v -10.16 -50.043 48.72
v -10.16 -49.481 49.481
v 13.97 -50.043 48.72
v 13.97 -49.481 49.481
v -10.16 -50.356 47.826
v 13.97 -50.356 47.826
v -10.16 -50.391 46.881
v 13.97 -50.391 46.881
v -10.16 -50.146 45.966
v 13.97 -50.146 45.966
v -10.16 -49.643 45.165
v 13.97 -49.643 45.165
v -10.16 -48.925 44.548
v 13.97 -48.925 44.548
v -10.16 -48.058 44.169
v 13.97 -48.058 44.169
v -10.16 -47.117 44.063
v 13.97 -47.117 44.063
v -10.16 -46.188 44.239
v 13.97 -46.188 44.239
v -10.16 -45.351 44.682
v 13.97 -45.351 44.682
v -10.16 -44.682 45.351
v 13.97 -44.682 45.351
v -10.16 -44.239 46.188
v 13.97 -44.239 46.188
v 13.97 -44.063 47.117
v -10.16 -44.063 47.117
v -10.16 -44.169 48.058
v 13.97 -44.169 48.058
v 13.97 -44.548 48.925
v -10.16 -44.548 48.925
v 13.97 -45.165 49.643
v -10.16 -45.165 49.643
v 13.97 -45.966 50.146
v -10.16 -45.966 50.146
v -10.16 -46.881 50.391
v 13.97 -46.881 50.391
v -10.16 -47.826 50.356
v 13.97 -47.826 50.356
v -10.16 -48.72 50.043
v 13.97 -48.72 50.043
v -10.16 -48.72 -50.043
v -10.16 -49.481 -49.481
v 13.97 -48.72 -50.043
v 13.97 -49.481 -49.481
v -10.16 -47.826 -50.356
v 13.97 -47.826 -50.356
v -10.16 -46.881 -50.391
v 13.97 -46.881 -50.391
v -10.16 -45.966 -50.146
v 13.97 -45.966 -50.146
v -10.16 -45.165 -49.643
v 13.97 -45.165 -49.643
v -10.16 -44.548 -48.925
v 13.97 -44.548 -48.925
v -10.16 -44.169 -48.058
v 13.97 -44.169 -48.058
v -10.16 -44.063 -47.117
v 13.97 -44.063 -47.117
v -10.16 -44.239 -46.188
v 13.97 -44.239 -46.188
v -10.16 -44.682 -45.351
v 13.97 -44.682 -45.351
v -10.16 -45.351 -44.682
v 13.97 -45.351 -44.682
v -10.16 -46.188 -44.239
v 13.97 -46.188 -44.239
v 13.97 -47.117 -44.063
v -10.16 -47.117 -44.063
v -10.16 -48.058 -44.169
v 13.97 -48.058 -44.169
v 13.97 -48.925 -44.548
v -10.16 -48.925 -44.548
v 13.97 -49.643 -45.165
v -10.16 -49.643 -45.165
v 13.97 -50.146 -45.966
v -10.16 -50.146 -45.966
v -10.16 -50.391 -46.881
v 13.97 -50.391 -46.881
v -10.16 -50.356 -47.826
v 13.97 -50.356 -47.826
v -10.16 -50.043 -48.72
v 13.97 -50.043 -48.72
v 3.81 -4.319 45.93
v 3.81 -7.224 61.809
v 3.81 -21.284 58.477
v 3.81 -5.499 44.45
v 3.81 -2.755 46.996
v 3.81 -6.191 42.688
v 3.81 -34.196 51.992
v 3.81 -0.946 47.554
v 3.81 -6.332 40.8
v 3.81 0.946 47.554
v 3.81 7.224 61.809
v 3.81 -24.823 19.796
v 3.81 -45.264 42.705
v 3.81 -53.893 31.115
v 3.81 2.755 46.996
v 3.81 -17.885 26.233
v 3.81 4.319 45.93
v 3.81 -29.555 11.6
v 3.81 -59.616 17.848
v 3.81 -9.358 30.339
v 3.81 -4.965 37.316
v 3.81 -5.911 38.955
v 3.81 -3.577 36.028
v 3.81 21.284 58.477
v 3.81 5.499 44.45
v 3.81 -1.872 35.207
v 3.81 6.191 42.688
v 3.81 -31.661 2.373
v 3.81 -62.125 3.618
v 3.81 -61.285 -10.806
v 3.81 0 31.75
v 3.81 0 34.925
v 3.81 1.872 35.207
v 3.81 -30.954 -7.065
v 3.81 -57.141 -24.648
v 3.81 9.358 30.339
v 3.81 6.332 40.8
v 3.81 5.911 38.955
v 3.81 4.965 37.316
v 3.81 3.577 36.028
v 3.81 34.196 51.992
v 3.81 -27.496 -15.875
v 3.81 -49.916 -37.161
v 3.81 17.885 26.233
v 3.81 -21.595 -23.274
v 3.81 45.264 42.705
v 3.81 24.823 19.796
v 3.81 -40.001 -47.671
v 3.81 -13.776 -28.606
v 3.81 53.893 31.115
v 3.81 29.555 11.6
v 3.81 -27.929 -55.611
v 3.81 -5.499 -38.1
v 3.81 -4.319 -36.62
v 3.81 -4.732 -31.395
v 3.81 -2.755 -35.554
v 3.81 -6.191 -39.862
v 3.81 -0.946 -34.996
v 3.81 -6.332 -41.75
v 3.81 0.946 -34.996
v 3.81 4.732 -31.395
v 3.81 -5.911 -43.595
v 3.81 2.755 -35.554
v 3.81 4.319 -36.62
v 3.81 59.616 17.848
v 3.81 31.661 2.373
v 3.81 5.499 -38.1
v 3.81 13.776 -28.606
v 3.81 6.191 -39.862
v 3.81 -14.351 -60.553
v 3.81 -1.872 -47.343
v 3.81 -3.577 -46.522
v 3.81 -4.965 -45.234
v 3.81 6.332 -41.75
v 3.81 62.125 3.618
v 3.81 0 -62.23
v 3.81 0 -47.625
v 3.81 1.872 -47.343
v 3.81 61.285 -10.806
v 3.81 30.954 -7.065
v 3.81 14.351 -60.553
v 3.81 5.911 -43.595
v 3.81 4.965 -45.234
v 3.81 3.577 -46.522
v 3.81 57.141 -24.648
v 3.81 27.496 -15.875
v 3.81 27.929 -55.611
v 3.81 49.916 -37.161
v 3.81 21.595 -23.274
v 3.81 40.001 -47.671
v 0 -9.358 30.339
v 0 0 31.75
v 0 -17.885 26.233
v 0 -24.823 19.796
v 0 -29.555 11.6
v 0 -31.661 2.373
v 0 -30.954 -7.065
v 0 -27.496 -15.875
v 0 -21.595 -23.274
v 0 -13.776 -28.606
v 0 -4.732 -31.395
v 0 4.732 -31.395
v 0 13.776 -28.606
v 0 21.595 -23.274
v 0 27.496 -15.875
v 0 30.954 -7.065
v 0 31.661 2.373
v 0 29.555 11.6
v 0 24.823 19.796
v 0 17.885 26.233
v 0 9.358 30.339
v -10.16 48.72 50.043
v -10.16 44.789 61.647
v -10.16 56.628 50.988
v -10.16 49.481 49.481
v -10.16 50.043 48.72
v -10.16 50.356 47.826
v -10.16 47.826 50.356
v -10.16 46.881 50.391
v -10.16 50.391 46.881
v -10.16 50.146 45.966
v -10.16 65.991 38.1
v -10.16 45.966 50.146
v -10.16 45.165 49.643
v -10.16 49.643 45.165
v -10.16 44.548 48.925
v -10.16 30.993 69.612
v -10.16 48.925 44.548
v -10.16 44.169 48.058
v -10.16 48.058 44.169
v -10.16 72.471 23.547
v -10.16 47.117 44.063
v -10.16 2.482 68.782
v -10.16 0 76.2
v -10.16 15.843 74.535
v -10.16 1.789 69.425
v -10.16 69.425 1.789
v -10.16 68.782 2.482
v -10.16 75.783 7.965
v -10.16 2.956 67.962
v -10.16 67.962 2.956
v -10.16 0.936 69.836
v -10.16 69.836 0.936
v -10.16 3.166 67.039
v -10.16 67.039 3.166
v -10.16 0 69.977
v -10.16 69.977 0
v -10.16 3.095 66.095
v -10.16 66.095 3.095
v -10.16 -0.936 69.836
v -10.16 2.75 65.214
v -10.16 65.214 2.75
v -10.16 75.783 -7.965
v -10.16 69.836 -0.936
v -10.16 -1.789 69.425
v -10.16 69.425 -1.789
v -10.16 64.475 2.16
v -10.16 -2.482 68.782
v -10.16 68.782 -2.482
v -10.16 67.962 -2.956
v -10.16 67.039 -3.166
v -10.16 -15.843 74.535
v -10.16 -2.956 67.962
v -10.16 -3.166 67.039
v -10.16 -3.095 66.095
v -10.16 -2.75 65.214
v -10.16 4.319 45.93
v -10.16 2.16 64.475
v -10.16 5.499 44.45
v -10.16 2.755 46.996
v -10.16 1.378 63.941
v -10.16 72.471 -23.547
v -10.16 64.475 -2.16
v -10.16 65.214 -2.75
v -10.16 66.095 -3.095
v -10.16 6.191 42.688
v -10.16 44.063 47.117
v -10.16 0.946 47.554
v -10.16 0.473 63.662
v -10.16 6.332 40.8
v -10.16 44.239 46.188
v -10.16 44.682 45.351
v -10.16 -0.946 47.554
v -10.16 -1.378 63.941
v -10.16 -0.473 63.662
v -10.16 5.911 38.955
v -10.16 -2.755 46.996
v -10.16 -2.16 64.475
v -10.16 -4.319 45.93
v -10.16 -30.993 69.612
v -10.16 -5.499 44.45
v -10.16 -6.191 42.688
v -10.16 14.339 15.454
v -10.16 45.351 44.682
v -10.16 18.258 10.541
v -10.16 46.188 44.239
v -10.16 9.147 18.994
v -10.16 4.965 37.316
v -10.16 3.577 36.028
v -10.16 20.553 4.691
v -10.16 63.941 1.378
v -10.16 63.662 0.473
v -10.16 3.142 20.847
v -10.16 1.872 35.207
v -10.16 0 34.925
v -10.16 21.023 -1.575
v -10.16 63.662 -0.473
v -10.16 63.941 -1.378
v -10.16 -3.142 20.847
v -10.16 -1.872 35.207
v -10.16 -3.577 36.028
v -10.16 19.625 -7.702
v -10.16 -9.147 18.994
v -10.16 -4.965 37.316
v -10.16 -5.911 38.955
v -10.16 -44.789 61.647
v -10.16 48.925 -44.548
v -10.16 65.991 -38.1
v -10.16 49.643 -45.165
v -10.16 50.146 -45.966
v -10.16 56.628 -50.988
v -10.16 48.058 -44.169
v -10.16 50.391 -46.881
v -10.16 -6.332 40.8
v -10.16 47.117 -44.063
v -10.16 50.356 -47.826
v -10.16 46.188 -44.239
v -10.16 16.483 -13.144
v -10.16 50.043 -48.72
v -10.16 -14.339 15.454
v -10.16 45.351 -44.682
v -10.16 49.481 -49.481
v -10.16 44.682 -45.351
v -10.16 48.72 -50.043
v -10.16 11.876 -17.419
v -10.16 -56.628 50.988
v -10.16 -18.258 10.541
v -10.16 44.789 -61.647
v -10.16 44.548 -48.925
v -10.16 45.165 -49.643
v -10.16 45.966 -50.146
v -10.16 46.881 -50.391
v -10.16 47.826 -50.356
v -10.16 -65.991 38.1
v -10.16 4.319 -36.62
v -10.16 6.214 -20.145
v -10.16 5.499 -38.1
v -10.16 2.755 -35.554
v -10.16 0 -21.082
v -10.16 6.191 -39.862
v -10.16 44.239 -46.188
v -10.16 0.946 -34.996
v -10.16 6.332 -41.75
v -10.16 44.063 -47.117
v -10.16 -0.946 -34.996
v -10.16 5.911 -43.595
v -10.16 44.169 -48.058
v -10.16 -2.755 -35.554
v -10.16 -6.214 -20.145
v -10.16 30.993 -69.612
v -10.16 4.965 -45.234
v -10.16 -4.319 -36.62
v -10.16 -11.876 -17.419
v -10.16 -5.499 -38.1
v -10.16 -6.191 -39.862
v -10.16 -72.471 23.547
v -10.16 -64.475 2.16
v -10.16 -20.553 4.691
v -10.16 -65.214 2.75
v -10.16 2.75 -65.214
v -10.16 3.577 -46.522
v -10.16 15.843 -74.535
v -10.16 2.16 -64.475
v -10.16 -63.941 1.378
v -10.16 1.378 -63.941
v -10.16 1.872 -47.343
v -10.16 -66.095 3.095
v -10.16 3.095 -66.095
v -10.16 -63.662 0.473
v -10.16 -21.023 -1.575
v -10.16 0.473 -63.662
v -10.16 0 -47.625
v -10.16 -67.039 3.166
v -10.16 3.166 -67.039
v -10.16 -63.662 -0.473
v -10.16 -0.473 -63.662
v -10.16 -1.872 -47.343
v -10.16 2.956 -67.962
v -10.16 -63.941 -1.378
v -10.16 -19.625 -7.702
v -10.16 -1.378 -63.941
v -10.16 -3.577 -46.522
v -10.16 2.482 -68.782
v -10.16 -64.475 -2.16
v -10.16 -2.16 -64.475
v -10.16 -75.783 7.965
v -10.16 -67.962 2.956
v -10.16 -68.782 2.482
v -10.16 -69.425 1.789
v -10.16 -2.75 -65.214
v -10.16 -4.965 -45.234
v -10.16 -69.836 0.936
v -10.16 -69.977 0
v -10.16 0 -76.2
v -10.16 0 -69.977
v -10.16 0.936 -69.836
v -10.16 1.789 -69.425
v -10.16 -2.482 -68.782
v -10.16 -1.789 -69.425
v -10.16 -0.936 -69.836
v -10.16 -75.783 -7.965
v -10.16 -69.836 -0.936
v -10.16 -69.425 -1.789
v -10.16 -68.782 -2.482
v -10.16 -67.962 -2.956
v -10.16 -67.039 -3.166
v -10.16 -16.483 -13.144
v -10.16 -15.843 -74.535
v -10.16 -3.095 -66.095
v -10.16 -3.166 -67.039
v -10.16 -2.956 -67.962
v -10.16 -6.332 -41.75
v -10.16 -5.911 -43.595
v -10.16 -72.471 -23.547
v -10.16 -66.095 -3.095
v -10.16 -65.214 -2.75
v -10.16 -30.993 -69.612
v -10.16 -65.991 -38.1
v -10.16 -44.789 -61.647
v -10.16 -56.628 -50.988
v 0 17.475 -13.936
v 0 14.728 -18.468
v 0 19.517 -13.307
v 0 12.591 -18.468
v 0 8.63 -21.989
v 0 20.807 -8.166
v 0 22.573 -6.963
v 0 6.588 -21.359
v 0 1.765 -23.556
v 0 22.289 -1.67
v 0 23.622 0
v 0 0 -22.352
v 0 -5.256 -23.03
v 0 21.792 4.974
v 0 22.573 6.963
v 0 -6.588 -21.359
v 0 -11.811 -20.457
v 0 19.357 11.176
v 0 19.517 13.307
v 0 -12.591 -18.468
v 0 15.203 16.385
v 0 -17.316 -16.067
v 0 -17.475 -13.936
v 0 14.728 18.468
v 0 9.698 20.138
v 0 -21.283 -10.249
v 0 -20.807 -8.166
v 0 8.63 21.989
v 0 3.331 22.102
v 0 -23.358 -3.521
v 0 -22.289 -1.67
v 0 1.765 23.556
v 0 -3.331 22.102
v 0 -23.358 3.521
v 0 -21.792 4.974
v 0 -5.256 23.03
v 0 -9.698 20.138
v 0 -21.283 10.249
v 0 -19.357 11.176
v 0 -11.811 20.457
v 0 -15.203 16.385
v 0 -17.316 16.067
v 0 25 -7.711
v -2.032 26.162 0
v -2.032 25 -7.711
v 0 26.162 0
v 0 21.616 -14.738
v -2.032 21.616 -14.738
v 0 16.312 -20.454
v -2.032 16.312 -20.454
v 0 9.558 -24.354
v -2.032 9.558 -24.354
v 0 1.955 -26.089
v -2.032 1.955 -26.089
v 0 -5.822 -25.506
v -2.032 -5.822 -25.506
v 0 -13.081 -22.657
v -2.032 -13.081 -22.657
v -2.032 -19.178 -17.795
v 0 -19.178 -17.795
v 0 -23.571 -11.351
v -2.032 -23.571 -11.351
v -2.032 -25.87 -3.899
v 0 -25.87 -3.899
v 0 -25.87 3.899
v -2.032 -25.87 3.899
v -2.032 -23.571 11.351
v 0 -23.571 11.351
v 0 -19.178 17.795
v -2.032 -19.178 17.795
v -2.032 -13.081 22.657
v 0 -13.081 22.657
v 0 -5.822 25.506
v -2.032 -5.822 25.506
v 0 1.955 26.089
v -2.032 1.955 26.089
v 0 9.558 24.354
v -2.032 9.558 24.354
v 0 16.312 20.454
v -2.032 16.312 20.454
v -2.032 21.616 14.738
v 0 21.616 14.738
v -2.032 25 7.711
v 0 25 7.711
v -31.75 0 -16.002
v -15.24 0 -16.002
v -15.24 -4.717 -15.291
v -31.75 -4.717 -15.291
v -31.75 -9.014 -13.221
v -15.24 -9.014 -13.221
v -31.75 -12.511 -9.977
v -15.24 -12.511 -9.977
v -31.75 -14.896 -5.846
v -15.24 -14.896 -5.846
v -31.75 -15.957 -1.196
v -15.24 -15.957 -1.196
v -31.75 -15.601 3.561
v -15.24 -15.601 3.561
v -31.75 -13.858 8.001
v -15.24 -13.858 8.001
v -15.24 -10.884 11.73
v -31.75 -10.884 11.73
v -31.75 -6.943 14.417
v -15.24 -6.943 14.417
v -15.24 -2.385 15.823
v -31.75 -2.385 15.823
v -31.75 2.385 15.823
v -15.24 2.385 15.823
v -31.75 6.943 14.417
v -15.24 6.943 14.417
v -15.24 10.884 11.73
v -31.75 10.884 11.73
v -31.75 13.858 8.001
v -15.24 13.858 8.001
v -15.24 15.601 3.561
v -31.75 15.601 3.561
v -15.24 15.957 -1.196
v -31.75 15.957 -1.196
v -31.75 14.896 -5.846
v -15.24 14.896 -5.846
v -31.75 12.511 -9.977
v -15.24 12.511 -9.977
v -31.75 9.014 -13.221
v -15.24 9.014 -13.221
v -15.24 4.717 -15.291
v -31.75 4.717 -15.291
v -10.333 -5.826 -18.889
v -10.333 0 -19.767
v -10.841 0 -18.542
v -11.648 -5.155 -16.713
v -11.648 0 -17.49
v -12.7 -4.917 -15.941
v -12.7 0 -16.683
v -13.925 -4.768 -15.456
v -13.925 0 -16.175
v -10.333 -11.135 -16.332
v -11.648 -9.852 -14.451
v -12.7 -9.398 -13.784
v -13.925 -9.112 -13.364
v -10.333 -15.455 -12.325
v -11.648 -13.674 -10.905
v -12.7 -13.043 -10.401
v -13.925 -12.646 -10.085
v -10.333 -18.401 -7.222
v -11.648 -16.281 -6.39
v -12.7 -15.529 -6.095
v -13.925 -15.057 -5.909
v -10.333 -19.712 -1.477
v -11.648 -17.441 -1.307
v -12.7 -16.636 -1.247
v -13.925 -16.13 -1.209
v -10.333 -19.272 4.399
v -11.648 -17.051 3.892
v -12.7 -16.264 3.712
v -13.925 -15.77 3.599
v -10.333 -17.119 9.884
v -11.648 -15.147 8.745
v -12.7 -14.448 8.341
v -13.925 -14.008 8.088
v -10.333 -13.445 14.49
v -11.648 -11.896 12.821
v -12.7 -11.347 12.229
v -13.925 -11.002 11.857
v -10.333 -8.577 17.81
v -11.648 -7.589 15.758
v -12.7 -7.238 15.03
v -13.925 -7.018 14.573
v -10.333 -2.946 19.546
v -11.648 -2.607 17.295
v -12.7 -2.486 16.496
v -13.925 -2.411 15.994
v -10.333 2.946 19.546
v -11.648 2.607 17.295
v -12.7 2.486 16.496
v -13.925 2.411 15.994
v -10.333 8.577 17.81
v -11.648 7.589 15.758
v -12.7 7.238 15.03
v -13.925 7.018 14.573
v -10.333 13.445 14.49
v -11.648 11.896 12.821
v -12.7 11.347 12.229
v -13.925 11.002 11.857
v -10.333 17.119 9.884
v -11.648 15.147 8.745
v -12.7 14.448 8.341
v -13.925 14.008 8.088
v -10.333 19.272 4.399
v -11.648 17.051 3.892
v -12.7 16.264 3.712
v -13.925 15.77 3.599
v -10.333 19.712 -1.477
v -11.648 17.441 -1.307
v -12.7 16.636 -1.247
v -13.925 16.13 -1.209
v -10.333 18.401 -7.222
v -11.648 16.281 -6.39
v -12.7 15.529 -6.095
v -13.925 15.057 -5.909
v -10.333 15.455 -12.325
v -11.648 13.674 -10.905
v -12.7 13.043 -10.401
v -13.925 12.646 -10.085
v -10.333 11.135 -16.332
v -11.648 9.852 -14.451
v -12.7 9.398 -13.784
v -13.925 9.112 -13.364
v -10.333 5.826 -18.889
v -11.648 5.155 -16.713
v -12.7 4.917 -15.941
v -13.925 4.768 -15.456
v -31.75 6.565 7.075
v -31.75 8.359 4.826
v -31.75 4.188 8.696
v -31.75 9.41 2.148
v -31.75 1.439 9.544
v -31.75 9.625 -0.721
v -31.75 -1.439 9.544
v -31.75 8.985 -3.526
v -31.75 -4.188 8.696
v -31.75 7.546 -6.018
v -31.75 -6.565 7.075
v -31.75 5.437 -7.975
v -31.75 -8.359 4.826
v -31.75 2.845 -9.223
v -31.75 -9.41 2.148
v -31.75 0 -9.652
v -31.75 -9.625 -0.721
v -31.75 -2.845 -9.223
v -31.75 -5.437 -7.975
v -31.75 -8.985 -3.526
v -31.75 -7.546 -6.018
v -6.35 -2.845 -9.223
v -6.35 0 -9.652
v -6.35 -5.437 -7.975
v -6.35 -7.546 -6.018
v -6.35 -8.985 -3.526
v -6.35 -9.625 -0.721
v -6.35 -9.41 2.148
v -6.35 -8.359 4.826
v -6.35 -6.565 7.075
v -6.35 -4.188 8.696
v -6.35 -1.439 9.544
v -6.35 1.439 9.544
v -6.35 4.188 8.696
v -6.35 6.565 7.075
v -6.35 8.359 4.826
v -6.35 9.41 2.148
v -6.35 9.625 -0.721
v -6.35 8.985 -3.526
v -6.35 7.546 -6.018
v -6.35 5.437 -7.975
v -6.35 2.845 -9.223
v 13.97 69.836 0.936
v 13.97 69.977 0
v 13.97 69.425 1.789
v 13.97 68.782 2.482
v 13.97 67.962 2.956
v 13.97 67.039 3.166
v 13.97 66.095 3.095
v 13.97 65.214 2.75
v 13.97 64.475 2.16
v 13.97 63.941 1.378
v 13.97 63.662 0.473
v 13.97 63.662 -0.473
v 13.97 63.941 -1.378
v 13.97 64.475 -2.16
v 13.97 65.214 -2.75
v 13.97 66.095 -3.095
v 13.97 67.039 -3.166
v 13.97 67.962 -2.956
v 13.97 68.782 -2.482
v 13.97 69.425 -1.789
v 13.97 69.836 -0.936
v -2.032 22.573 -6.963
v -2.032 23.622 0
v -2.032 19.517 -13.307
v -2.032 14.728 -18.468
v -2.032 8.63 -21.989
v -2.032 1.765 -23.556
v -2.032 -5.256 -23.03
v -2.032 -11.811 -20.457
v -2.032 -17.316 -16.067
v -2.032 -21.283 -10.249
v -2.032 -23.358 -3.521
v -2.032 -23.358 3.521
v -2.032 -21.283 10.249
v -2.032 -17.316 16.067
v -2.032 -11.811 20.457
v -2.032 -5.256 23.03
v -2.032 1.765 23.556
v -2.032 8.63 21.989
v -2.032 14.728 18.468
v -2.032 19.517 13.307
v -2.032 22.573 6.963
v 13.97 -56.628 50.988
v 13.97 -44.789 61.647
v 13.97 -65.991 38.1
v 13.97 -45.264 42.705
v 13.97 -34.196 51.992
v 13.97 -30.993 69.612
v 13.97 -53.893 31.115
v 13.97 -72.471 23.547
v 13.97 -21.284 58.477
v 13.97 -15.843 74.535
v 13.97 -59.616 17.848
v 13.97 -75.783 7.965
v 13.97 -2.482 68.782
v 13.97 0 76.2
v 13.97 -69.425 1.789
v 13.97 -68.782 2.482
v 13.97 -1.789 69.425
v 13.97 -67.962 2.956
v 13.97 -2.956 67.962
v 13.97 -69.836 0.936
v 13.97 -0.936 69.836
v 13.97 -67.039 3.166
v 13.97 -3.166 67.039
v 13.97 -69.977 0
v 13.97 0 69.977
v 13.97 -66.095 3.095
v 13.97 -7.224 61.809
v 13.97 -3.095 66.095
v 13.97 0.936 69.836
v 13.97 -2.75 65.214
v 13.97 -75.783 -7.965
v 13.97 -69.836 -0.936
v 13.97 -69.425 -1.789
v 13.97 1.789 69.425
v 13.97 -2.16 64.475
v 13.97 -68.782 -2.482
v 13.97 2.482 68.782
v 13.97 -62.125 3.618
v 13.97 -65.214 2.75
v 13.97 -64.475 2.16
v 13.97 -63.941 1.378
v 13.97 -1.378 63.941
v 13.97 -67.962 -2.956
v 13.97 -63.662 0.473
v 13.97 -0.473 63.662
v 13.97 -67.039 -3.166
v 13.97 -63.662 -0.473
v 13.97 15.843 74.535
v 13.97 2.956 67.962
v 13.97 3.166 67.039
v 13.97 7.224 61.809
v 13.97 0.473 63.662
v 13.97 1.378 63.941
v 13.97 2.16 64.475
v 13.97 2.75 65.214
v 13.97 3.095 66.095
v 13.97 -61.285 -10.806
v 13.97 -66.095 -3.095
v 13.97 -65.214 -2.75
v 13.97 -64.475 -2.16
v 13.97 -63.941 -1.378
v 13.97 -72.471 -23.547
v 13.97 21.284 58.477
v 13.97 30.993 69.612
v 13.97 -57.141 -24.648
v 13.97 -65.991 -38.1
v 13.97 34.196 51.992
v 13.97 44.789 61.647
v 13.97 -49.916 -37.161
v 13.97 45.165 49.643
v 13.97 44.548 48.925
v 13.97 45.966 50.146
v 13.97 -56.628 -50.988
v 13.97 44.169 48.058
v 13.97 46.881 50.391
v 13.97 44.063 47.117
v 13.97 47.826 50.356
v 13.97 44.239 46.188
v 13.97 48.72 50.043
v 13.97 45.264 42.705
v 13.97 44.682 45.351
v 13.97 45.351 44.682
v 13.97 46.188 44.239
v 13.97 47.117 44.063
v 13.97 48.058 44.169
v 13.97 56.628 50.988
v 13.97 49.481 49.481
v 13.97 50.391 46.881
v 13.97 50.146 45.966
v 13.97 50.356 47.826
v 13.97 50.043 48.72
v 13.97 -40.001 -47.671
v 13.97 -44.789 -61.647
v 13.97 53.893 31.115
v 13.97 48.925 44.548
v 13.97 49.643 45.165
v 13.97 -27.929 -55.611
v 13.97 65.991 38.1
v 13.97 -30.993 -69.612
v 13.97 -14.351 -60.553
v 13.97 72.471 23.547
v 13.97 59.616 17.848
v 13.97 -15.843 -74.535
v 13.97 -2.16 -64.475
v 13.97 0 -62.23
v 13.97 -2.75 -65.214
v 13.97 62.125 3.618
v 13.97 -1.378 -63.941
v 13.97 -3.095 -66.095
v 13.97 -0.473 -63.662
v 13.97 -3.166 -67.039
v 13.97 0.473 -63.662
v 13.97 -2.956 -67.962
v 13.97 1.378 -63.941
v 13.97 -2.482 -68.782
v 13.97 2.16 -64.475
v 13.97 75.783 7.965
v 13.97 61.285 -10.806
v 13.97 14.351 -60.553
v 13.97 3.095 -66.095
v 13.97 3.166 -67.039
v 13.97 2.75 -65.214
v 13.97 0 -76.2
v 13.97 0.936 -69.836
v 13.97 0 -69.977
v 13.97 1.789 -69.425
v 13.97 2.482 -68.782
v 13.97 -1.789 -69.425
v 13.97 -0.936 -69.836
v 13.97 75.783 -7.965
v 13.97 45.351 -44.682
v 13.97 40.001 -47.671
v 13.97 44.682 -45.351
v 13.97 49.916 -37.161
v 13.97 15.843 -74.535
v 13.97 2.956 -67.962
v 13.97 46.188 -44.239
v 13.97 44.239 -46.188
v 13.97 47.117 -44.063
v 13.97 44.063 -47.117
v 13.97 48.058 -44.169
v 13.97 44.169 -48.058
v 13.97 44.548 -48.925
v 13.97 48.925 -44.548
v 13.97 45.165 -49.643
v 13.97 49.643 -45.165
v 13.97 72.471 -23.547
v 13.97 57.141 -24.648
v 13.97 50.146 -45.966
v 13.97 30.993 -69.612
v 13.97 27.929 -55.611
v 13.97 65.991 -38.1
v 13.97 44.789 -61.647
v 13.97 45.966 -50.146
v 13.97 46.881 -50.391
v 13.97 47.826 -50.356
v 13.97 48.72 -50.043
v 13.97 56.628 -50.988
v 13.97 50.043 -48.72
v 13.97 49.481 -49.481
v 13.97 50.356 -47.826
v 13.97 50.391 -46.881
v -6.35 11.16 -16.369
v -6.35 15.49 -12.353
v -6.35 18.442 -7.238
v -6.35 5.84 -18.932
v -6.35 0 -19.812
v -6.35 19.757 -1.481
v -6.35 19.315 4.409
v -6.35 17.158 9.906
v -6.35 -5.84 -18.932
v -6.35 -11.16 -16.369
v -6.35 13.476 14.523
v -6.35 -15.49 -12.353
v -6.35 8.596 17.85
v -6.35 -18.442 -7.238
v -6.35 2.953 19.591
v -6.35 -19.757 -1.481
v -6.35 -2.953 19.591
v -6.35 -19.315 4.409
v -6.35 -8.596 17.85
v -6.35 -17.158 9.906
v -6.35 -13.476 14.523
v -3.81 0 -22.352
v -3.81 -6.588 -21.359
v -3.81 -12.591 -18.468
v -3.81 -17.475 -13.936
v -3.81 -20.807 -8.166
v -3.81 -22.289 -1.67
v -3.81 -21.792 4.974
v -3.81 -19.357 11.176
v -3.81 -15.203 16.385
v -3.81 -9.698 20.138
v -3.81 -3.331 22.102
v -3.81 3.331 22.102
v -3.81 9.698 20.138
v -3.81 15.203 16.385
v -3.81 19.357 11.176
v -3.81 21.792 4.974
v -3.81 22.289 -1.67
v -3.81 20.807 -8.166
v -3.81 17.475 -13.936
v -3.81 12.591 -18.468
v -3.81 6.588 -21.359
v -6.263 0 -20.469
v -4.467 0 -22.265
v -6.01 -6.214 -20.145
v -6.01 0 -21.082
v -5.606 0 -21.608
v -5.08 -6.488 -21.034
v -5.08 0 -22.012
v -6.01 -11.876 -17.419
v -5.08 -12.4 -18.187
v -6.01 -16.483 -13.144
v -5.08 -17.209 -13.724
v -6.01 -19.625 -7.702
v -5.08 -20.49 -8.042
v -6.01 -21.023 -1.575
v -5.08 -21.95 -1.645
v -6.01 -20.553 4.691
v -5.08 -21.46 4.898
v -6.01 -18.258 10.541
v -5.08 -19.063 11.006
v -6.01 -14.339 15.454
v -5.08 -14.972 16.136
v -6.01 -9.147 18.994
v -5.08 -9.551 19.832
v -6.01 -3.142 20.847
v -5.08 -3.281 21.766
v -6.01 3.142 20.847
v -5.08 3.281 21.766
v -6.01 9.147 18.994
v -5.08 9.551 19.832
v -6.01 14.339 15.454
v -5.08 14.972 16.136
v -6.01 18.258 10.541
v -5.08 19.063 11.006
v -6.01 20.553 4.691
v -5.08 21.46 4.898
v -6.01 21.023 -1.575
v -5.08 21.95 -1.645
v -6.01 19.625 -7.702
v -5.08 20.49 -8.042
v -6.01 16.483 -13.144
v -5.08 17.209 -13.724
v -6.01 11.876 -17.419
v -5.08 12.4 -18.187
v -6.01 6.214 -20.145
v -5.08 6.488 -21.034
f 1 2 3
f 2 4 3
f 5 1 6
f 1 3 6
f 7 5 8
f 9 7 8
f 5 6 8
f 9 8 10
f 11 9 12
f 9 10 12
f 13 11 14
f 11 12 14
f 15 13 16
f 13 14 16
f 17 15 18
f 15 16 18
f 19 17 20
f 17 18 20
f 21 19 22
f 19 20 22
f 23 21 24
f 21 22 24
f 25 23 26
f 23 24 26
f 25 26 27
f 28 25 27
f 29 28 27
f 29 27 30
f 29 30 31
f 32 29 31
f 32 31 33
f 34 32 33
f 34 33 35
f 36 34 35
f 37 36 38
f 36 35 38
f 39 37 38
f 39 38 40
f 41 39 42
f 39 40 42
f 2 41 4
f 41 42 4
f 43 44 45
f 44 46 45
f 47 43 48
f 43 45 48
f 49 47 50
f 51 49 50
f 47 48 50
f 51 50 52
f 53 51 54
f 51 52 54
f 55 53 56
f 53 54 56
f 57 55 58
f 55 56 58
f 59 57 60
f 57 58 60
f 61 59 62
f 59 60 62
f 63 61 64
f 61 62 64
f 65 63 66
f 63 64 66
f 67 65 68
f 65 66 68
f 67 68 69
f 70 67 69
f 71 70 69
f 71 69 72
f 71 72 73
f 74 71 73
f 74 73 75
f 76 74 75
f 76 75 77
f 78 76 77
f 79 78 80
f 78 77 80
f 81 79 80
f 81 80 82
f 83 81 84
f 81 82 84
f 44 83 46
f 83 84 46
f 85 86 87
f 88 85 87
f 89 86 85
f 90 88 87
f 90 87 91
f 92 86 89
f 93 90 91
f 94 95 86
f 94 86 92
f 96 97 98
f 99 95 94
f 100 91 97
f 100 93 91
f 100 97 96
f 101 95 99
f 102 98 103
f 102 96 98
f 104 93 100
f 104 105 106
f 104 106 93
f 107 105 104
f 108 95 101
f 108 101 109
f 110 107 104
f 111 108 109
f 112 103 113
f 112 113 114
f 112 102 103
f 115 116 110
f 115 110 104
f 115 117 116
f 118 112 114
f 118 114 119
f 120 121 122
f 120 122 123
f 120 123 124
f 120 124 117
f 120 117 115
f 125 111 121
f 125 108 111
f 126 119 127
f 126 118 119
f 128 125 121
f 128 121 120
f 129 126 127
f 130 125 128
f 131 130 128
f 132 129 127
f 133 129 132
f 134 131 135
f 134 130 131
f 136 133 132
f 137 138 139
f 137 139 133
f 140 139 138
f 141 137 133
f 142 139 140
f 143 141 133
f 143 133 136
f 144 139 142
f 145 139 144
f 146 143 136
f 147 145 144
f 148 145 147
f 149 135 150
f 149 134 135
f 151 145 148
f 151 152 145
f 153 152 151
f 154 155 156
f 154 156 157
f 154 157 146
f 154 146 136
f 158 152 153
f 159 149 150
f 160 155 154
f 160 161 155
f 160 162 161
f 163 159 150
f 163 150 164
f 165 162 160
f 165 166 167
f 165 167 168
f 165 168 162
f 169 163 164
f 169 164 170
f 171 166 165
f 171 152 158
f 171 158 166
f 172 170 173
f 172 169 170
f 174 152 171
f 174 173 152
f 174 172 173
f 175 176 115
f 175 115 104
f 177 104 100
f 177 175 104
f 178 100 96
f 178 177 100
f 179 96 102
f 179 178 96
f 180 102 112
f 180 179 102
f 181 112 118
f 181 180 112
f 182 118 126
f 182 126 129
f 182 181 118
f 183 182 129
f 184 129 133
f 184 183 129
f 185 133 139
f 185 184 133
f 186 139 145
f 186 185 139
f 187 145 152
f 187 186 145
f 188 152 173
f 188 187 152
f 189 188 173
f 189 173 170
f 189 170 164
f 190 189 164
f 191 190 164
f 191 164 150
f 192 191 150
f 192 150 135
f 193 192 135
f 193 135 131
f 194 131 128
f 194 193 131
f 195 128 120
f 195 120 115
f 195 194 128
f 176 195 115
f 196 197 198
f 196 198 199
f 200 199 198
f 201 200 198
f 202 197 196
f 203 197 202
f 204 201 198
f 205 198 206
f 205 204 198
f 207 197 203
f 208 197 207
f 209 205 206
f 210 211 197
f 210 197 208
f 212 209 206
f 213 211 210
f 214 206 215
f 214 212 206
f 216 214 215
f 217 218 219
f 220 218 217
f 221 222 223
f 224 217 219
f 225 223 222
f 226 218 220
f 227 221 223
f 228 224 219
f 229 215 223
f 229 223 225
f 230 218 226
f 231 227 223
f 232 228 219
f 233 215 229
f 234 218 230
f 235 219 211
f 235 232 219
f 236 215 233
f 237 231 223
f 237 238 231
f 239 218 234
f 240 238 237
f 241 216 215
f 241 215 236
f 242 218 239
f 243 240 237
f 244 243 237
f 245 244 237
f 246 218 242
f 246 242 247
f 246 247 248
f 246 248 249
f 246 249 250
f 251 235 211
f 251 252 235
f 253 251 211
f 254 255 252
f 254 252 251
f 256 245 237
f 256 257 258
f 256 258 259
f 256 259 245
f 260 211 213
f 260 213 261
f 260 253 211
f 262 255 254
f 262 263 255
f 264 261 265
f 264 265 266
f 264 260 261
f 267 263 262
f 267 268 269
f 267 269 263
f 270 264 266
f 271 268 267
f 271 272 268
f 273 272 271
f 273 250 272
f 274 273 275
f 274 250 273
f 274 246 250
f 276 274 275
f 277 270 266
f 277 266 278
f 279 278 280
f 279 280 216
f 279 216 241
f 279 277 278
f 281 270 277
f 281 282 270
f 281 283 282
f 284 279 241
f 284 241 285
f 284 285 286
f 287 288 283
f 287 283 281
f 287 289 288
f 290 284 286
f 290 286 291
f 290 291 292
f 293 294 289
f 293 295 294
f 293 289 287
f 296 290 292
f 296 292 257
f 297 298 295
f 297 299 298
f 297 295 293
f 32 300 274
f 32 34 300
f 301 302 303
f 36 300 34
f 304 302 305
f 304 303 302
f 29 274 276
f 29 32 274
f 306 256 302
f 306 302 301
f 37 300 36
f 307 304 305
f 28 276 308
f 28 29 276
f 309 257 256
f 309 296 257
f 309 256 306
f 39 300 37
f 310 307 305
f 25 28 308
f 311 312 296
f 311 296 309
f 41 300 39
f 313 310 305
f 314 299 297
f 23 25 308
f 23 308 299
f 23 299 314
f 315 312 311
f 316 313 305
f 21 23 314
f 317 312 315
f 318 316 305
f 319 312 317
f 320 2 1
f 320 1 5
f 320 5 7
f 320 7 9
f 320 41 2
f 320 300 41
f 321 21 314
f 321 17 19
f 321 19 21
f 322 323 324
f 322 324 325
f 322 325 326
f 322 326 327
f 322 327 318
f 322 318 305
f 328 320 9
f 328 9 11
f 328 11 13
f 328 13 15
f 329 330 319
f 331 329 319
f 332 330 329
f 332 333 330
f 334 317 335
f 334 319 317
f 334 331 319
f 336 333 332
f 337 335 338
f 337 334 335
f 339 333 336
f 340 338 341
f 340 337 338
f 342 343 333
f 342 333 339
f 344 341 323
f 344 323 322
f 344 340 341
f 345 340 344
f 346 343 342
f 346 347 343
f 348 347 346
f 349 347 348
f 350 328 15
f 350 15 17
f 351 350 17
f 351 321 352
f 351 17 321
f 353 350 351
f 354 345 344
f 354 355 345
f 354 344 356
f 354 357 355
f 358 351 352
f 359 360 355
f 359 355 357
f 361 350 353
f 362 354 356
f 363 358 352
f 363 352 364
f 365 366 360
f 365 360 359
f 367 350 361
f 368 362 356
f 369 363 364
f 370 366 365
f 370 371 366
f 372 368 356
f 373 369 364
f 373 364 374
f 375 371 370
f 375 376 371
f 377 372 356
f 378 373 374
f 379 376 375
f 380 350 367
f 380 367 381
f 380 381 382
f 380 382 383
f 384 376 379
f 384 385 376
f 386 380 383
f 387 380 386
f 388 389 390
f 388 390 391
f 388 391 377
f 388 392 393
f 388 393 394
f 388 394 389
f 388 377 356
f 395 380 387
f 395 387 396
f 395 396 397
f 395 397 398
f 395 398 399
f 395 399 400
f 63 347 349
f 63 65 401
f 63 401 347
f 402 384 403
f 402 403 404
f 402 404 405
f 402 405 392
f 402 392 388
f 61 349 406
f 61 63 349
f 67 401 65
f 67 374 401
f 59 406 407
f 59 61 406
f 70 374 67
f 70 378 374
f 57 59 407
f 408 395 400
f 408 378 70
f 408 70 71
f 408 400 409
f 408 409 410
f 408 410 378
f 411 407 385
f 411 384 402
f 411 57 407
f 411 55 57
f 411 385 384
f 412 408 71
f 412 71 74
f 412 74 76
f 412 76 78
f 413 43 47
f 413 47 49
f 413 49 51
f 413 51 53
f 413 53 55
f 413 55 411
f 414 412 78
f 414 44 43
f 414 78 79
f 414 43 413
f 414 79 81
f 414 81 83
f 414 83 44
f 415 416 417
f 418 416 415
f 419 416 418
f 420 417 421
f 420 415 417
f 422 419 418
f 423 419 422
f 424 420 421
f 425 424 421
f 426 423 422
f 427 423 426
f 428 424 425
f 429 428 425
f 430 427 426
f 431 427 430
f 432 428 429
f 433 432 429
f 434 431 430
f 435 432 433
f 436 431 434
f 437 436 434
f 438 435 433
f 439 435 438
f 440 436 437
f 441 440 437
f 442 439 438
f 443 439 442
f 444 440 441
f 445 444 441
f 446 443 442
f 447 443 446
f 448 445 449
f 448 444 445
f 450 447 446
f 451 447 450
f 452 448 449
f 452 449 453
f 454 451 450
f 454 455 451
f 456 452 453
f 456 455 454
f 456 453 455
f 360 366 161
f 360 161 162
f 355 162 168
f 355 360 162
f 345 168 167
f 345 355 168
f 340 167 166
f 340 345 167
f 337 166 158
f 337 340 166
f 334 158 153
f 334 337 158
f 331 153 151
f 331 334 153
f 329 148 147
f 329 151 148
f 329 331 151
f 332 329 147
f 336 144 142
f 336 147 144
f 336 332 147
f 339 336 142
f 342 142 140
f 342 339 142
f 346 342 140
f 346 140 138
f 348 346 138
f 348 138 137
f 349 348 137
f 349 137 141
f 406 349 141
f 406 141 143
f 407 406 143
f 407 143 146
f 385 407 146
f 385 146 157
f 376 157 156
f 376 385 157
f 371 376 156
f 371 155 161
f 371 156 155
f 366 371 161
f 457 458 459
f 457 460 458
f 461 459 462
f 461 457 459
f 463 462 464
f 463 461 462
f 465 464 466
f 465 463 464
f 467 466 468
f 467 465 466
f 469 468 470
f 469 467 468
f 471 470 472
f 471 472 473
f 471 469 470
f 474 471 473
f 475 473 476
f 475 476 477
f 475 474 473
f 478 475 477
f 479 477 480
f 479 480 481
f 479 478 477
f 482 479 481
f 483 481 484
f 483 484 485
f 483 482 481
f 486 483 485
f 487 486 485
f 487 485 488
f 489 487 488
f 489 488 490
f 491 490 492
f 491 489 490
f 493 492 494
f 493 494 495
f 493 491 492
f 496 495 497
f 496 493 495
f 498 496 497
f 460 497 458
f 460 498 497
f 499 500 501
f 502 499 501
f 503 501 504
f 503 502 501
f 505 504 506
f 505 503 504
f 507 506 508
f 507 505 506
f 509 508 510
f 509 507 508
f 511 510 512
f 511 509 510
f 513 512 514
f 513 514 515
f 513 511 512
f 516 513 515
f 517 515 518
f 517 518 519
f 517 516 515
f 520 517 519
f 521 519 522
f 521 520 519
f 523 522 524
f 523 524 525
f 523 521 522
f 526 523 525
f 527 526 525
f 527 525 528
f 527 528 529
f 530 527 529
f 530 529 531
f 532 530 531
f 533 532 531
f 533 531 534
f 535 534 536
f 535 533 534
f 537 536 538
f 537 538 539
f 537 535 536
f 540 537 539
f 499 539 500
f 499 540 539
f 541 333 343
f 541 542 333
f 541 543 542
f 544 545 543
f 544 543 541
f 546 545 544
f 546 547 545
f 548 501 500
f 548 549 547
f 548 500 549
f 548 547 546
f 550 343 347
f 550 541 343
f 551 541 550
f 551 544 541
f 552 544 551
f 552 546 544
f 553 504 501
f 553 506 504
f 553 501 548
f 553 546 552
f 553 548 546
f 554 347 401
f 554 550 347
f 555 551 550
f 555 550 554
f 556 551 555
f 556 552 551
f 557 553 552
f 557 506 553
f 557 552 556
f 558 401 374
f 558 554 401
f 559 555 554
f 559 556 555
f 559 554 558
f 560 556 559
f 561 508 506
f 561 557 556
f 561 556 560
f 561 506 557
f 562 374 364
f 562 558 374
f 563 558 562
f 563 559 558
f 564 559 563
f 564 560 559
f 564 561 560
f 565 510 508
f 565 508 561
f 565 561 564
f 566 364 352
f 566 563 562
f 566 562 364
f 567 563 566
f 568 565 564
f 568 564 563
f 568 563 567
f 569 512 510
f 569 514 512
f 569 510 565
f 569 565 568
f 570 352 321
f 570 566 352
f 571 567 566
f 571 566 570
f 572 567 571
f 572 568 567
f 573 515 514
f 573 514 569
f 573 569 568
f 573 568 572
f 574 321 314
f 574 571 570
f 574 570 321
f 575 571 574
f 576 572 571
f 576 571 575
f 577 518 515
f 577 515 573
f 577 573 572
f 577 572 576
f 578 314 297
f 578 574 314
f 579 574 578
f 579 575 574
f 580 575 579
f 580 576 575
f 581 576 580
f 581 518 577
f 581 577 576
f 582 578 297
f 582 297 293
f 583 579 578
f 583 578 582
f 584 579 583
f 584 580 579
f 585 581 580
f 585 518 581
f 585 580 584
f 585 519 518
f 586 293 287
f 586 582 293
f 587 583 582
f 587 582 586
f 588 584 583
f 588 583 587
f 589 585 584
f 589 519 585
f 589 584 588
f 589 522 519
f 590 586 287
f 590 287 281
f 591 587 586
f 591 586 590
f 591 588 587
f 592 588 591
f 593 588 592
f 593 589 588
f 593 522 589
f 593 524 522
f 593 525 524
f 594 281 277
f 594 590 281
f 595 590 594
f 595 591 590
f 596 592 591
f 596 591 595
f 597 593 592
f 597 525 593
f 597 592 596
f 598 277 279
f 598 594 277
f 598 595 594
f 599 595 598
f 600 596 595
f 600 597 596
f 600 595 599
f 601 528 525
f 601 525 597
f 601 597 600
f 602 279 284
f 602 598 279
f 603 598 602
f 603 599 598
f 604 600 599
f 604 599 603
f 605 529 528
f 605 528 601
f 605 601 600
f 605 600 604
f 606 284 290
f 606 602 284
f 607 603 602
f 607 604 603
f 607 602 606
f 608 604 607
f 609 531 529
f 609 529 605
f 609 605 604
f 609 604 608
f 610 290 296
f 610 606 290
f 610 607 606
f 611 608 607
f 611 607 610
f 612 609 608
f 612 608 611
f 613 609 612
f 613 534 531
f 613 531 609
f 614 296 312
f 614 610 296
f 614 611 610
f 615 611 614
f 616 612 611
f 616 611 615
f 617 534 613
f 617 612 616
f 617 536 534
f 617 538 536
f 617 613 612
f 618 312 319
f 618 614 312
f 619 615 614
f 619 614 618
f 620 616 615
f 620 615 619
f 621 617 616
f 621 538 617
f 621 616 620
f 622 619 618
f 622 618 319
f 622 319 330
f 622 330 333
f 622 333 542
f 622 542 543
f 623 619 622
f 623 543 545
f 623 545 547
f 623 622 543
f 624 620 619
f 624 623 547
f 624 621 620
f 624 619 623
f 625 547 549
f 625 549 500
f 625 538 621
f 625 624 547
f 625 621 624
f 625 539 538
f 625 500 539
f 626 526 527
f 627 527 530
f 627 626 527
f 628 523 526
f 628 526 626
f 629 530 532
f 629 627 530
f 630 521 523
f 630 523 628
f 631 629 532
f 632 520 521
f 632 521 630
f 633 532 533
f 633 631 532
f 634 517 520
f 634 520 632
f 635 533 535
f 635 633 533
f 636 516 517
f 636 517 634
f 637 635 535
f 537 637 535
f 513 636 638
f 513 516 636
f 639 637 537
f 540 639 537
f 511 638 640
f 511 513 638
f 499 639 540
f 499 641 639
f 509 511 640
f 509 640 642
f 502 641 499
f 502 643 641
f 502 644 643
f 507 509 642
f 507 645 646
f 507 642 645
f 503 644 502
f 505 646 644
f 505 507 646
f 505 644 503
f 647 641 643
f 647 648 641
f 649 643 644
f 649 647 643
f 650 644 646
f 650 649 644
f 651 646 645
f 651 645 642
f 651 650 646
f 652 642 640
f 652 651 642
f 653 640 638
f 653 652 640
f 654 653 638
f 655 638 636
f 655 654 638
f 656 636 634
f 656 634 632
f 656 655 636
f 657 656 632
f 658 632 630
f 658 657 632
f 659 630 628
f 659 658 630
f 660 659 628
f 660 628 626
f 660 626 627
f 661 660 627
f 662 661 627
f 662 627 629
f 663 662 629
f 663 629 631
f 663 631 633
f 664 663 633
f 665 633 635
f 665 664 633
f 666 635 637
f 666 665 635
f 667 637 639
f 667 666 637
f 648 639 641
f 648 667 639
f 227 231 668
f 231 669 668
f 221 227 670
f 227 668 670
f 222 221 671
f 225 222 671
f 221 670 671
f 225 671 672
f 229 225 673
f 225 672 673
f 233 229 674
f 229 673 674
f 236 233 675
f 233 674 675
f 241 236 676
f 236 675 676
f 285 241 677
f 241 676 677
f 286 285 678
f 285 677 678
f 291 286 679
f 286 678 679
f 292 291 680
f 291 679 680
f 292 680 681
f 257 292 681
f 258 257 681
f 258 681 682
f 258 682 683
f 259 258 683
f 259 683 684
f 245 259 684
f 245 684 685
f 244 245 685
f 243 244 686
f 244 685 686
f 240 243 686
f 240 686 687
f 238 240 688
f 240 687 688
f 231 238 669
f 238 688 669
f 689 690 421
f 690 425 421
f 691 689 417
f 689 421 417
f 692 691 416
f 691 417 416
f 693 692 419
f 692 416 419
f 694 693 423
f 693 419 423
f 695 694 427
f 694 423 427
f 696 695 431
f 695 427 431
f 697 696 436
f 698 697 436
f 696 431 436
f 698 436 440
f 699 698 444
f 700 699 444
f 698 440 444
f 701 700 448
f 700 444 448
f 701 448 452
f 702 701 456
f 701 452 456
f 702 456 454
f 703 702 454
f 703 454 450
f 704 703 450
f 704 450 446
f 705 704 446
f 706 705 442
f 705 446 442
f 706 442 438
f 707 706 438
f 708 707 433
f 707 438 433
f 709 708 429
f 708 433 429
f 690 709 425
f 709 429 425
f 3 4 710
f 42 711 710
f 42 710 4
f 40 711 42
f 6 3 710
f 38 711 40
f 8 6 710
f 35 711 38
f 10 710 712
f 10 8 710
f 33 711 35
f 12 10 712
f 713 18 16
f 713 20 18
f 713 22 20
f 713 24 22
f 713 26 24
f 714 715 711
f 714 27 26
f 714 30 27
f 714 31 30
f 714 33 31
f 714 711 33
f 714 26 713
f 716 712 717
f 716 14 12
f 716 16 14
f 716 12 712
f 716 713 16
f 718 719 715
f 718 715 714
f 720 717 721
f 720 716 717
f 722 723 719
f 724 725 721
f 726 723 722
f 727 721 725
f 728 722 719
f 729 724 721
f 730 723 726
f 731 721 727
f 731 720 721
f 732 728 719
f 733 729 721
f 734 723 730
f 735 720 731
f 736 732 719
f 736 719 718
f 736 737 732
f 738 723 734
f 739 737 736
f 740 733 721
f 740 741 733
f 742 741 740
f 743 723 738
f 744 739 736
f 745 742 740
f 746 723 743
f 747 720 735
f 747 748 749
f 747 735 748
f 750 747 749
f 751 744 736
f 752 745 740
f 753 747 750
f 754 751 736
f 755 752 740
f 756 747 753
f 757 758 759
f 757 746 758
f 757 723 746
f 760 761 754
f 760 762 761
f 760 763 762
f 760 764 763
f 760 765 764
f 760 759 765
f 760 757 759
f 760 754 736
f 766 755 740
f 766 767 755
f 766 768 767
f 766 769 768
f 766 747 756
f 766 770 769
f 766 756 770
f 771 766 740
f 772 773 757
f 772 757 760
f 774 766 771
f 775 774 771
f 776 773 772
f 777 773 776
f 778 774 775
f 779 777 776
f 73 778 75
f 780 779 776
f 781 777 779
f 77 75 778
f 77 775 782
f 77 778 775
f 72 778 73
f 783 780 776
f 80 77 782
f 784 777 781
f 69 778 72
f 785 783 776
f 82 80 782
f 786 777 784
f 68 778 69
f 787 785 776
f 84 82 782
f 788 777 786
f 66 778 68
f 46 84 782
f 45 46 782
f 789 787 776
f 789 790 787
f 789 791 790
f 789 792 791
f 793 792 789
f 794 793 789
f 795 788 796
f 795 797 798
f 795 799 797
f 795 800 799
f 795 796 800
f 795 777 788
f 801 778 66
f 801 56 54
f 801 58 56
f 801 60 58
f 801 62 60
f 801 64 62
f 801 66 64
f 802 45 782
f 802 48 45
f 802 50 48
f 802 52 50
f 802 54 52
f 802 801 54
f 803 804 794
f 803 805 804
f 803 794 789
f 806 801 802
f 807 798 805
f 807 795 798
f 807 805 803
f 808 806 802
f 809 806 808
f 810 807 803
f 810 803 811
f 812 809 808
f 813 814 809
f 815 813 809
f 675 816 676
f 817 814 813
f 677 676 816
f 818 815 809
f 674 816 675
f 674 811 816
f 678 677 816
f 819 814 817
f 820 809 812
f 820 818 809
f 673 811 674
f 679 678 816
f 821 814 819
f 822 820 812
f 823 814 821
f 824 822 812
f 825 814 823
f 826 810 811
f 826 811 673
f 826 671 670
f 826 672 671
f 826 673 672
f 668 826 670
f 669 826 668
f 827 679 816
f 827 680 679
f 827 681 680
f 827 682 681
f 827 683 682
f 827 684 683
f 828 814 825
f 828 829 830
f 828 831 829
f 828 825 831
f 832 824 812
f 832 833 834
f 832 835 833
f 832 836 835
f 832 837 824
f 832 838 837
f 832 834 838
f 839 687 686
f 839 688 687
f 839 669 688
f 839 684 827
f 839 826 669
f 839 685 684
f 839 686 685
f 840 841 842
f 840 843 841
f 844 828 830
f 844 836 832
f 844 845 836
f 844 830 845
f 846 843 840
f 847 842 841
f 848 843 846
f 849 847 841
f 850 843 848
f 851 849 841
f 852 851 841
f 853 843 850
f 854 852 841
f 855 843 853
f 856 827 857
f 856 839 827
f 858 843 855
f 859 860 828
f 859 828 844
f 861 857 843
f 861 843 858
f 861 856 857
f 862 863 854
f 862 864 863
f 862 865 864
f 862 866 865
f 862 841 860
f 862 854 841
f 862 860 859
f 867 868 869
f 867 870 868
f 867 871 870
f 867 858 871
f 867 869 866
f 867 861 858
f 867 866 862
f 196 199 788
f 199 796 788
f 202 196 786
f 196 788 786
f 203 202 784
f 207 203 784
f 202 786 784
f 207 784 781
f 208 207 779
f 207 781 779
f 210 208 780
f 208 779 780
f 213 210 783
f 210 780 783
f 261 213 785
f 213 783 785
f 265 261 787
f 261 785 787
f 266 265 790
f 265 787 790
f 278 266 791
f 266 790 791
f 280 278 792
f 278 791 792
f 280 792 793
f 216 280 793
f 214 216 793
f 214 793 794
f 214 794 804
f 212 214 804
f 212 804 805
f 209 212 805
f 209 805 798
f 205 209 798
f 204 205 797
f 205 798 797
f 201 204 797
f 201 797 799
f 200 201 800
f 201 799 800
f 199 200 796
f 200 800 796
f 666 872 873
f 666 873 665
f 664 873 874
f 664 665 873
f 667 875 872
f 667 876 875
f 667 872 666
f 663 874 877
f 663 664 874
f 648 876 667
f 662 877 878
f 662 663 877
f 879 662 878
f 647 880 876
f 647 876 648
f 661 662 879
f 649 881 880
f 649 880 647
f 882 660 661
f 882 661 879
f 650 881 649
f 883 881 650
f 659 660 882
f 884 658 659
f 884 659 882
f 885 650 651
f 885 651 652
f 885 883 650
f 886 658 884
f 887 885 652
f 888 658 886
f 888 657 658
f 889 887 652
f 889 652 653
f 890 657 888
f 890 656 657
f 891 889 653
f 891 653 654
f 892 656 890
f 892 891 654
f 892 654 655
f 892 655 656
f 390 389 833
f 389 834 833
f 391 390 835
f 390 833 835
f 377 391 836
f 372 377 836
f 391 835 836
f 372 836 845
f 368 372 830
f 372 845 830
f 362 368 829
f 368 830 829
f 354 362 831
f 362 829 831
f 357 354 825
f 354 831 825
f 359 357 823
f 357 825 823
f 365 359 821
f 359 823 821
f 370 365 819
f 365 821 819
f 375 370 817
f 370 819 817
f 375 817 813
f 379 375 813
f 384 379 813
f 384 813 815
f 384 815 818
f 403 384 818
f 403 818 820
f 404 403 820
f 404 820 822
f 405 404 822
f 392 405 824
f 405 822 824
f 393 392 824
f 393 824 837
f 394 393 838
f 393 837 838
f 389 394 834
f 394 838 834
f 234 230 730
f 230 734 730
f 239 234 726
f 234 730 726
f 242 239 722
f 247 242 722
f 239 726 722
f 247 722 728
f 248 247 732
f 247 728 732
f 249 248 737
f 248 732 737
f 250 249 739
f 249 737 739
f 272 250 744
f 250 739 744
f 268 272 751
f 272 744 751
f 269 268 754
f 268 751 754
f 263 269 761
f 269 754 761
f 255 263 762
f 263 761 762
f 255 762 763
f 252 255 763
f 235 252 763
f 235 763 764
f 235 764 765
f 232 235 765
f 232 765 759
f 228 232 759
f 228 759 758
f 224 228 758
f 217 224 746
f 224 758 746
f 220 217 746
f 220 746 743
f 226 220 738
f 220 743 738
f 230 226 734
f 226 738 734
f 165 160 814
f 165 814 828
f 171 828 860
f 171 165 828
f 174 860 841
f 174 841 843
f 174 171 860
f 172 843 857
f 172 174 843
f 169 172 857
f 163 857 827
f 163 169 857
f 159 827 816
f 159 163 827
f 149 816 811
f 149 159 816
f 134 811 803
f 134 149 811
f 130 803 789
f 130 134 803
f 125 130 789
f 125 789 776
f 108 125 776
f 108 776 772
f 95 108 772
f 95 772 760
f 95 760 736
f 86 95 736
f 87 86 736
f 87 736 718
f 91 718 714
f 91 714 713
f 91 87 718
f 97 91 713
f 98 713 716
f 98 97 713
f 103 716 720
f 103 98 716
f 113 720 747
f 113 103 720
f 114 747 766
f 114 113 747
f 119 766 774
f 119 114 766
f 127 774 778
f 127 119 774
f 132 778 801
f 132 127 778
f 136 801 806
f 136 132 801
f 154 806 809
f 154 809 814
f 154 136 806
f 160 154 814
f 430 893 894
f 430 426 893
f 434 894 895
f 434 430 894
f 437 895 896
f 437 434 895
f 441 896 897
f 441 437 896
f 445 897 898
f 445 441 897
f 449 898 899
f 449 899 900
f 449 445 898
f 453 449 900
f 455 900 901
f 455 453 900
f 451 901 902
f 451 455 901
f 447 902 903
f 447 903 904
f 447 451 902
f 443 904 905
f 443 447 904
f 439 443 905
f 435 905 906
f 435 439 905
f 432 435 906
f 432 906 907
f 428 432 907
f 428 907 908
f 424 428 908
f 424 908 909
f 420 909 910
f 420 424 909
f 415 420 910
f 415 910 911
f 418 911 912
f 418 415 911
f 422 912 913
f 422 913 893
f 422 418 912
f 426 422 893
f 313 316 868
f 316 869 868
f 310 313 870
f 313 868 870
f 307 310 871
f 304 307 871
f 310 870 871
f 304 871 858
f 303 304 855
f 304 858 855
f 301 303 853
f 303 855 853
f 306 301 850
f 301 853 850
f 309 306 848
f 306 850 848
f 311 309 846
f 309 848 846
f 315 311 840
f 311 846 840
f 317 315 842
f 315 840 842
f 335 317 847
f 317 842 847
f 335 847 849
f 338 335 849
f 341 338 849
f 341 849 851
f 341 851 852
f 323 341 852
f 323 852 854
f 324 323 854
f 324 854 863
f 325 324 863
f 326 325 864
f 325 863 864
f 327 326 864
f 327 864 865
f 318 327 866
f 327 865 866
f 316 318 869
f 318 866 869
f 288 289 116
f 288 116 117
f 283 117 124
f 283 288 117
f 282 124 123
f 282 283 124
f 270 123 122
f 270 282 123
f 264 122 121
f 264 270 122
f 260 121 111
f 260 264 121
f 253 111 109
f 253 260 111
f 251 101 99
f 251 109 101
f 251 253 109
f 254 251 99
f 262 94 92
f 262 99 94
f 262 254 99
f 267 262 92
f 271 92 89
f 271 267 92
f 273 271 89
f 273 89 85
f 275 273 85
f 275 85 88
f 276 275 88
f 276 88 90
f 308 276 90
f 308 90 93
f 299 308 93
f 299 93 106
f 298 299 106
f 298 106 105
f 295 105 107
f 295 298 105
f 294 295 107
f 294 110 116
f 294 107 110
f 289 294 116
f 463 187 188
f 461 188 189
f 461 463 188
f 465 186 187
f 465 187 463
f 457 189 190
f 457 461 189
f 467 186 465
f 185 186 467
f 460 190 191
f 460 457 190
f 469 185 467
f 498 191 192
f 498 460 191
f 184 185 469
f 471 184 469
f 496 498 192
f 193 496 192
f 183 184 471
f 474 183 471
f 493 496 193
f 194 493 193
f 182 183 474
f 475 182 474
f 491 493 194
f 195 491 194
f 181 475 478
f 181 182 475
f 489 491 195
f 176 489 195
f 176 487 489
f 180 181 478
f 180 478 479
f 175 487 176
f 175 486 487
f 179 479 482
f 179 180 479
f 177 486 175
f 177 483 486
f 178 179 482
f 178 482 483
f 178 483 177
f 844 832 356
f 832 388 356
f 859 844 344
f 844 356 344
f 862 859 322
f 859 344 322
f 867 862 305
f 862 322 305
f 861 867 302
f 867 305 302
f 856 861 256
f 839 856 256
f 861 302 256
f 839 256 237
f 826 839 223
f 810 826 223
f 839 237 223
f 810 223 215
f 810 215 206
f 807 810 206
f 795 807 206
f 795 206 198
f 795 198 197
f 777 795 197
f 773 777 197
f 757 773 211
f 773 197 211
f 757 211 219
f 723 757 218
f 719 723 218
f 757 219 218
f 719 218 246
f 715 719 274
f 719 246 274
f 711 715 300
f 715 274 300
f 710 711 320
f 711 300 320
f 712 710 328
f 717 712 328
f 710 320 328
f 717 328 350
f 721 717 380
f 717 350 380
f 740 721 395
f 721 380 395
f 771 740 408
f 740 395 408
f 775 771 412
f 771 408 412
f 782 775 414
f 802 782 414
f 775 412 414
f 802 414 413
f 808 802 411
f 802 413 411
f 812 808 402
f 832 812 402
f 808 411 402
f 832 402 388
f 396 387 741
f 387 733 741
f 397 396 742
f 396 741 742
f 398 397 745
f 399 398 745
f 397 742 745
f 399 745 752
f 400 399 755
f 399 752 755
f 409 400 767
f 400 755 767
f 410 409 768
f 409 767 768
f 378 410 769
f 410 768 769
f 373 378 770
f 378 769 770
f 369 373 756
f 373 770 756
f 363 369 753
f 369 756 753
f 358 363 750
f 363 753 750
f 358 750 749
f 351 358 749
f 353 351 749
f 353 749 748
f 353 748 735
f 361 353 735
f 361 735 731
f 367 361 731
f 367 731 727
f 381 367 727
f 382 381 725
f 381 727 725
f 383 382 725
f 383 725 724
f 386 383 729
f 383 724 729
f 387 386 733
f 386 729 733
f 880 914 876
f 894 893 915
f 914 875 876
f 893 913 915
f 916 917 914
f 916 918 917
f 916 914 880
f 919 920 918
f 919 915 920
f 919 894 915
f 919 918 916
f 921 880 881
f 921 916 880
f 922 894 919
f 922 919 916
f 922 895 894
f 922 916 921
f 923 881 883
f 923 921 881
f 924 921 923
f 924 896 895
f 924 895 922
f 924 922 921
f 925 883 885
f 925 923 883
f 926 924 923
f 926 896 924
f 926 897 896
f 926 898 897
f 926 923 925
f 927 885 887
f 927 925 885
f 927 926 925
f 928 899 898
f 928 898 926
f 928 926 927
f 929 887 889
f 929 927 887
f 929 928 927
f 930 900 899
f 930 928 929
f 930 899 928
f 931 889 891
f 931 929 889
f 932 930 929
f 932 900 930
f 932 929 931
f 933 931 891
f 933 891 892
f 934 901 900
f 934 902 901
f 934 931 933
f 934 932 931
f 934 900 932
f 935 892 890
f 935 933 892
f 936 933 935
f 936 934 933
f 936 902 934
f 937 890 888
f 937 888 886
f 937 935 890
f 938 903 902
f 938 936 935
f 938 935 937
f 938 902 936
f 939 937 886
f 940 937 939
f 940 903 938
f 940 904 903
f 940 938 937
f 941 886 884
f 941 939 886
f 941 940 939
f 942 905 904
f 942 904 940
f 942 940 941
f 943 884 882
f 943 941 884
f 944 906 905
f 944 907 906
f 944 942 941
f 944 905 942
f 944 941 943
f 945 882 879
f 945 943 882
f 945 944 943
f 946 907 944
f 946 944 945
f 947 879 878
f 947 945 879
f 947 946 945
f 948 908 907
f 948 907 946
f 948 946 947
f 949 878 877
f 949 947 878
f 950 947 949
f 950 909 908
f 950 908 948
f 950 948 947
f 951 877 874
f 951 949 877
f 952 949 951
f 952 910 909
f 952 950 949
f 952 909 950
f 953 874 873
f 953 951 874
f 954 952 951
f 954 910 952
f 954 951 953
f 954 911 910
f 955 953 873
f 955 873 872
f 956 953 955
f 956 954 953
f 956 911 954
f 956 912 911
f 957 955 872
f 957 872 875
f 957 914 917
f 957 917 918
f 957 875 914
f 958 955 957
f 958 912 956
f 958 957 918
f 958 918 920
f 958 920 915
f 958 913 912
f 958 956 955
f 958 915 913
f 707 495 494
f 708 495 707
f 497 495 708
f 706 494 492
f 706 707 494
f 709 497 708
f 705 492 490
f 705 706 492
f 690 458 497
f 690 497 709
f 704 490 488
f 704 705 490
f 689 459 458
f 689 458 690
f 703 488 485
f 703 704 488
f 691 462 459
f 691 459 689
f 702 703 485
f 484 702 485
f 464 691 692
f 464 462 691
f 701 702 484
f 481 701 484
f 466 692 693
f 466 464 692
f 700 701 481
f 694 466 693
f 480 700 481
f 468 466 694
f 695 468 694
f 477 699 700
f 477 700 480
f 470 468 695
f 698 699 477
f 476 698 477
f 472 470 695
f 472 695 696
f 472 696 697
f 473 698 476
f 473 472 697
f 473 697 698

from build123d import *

# Parameters (mm, degrees)
SKETCH4_W               = 2.032
SKETCH4_H               = 2.54
SKETCH5_R               = 76.2
SKETCH5_R_2             = 31.75
BOSS_EXTRUDE1_DEPTH     = 3.81
SKETCH6_R               = 76.2
SKETCH6_R_2             = 62.23
BOSS_EXTRUDE2_DEPTH     = 10.16
CUT_EXTRUDE1_DEPTH      = 113.342968182
CUT_EXTRUDE1_DEPTH_BACK = 113.342968182
SKETCH2_R               = 6.35
SKETCH3_R               = 3.175
CUT_EXTRUDE2_DEPTH      = 113.342968182
CIRPATTERN1_COUNT       = 8


with BuildPart() as part:
    # Sketch1 → Revolve1 (revolve)
    with BuildSketch(Plane.XY, mode=Mode.PRIVATE) as revolve1_sk:
        with BuildLine():
            Line((0, 76.2), (-10.16, 76.2))
            Line((-10.16, 76.2), (-10.16, 21.082))
            ThreePointArc((-10.16, 21.082), (-11.647897552, 17.489897552), (-15.24, 16.002))
            Line((-15.24, 16.002), (-31.75, 16.002))
            Line((-31.75, 16.002), (-31.75, 9.652))
            Line((-31.75, 9.652), (-6.35, 9.652))
            Line((-6.35, 9.652), (-6.35, 19.812))
            ThreePointArc((-6.35, 19.812), (-5.606051224, 21.608051224), (-3.81, 22.352))
            Line((-3.81, 22.352), (0, 22.352))
            Line((0, 22.352), (0, 76.2))
        make_face()
    revolve(revolve1_sk.sketch.rotate(Axis((0, 0, 0), (-1, 0, 0)), 90), axis=Axis((0, 0, 0), (-1, 0, 0)))

    # Sketch4 → Cut-Revolve1 (revolve, cut)
    with BuildSketch(Plane.XY):
        with Locations((-1.016, 24.892)):
            Rectangle(SKETCH4_W, SKETCH4_H)
    revolve(axis=Axis((0, 0, 0), (-1, 0, 0)), mode=Mode.SUBTRACT)

    # Sketch5 → Boss-Extrude1 (add)
    with BuildSketch(Plane(origin=(0, 0, 0), x_dir=(0, 0, -1), z_dir=(1, 0, 0))):
        Circle(SKETCH5_R)
        with Locations(Location((0, 0, 0), (0, 0, 180))):
            Circle(SKETCH5_R_2, mode=Mode.SUBTRACT)
    extrude(amount=BOSS_EXTRUDE1_DEPTH)

    # Sketch6 → Boss-Extrude2 (add)
    with BuildSketch(Plane(origin=(3.81, 0, 0), x_dir=(0, 0, -1), z_dir=(1, 0, 0))):
        Circle(SKETCH6_R)
        Circle(SKETCH6_R_2, mode=Mode.SUBTRACT)
    extrude(amount=BOSS_EXTRUDE2_DEPTH)

    # Sketch2 → Cut-Extrude1 (cut, two sides: drawn at the far end of the back side and taken through both)
    with BuildSketch(Plane(origin=(0, 0, 0), x_dir=(0, 0, -1), z_dir=(1, 0, 0)).offset(-CUT_EXTRUDE1_DEPTH_BACK)):
        with Locations((41.275, 0)):
            Circle(SKETCH2_R)
        with Locations((-41.275, 0)):
            Circle(SKETCH2_R)
    extrude(amount=CUT_EXTRUDE1_DEPTH + CUT_EXTRUDE1_DEPTH_BACK, mode=Mode.SUBTRACT)

    # Sketch3 → Cut-Extrude2 (cut, symmetric)
    with BuildSketch(Plane(origin=(0, 0, 0), x_dir=(0, 0, -1), z_dir=(1, 0, 0))):
        with Locations((66.802, 0)):
            Circle(SKETCH3_R)
    cut_extrude2 = extrude(amount=CUT_EXTRUDE2_DEPTH, both=True, mode=Mode.SUBTRACT)

    # CirPattern1: Cut-Extrude2 ×8 about axis
    cirpattern1_axis = Axis((0, 0, 0), (1, 0, 0))
    for i in range(1, CIRPATTERN1_COUNT):
        add(cut_extrude2.rotate(cirpattern1_axis, i * 360 / CIRPATTERN1_COUNT), mode=Mode.SUBTRACT)


solid = part.part
